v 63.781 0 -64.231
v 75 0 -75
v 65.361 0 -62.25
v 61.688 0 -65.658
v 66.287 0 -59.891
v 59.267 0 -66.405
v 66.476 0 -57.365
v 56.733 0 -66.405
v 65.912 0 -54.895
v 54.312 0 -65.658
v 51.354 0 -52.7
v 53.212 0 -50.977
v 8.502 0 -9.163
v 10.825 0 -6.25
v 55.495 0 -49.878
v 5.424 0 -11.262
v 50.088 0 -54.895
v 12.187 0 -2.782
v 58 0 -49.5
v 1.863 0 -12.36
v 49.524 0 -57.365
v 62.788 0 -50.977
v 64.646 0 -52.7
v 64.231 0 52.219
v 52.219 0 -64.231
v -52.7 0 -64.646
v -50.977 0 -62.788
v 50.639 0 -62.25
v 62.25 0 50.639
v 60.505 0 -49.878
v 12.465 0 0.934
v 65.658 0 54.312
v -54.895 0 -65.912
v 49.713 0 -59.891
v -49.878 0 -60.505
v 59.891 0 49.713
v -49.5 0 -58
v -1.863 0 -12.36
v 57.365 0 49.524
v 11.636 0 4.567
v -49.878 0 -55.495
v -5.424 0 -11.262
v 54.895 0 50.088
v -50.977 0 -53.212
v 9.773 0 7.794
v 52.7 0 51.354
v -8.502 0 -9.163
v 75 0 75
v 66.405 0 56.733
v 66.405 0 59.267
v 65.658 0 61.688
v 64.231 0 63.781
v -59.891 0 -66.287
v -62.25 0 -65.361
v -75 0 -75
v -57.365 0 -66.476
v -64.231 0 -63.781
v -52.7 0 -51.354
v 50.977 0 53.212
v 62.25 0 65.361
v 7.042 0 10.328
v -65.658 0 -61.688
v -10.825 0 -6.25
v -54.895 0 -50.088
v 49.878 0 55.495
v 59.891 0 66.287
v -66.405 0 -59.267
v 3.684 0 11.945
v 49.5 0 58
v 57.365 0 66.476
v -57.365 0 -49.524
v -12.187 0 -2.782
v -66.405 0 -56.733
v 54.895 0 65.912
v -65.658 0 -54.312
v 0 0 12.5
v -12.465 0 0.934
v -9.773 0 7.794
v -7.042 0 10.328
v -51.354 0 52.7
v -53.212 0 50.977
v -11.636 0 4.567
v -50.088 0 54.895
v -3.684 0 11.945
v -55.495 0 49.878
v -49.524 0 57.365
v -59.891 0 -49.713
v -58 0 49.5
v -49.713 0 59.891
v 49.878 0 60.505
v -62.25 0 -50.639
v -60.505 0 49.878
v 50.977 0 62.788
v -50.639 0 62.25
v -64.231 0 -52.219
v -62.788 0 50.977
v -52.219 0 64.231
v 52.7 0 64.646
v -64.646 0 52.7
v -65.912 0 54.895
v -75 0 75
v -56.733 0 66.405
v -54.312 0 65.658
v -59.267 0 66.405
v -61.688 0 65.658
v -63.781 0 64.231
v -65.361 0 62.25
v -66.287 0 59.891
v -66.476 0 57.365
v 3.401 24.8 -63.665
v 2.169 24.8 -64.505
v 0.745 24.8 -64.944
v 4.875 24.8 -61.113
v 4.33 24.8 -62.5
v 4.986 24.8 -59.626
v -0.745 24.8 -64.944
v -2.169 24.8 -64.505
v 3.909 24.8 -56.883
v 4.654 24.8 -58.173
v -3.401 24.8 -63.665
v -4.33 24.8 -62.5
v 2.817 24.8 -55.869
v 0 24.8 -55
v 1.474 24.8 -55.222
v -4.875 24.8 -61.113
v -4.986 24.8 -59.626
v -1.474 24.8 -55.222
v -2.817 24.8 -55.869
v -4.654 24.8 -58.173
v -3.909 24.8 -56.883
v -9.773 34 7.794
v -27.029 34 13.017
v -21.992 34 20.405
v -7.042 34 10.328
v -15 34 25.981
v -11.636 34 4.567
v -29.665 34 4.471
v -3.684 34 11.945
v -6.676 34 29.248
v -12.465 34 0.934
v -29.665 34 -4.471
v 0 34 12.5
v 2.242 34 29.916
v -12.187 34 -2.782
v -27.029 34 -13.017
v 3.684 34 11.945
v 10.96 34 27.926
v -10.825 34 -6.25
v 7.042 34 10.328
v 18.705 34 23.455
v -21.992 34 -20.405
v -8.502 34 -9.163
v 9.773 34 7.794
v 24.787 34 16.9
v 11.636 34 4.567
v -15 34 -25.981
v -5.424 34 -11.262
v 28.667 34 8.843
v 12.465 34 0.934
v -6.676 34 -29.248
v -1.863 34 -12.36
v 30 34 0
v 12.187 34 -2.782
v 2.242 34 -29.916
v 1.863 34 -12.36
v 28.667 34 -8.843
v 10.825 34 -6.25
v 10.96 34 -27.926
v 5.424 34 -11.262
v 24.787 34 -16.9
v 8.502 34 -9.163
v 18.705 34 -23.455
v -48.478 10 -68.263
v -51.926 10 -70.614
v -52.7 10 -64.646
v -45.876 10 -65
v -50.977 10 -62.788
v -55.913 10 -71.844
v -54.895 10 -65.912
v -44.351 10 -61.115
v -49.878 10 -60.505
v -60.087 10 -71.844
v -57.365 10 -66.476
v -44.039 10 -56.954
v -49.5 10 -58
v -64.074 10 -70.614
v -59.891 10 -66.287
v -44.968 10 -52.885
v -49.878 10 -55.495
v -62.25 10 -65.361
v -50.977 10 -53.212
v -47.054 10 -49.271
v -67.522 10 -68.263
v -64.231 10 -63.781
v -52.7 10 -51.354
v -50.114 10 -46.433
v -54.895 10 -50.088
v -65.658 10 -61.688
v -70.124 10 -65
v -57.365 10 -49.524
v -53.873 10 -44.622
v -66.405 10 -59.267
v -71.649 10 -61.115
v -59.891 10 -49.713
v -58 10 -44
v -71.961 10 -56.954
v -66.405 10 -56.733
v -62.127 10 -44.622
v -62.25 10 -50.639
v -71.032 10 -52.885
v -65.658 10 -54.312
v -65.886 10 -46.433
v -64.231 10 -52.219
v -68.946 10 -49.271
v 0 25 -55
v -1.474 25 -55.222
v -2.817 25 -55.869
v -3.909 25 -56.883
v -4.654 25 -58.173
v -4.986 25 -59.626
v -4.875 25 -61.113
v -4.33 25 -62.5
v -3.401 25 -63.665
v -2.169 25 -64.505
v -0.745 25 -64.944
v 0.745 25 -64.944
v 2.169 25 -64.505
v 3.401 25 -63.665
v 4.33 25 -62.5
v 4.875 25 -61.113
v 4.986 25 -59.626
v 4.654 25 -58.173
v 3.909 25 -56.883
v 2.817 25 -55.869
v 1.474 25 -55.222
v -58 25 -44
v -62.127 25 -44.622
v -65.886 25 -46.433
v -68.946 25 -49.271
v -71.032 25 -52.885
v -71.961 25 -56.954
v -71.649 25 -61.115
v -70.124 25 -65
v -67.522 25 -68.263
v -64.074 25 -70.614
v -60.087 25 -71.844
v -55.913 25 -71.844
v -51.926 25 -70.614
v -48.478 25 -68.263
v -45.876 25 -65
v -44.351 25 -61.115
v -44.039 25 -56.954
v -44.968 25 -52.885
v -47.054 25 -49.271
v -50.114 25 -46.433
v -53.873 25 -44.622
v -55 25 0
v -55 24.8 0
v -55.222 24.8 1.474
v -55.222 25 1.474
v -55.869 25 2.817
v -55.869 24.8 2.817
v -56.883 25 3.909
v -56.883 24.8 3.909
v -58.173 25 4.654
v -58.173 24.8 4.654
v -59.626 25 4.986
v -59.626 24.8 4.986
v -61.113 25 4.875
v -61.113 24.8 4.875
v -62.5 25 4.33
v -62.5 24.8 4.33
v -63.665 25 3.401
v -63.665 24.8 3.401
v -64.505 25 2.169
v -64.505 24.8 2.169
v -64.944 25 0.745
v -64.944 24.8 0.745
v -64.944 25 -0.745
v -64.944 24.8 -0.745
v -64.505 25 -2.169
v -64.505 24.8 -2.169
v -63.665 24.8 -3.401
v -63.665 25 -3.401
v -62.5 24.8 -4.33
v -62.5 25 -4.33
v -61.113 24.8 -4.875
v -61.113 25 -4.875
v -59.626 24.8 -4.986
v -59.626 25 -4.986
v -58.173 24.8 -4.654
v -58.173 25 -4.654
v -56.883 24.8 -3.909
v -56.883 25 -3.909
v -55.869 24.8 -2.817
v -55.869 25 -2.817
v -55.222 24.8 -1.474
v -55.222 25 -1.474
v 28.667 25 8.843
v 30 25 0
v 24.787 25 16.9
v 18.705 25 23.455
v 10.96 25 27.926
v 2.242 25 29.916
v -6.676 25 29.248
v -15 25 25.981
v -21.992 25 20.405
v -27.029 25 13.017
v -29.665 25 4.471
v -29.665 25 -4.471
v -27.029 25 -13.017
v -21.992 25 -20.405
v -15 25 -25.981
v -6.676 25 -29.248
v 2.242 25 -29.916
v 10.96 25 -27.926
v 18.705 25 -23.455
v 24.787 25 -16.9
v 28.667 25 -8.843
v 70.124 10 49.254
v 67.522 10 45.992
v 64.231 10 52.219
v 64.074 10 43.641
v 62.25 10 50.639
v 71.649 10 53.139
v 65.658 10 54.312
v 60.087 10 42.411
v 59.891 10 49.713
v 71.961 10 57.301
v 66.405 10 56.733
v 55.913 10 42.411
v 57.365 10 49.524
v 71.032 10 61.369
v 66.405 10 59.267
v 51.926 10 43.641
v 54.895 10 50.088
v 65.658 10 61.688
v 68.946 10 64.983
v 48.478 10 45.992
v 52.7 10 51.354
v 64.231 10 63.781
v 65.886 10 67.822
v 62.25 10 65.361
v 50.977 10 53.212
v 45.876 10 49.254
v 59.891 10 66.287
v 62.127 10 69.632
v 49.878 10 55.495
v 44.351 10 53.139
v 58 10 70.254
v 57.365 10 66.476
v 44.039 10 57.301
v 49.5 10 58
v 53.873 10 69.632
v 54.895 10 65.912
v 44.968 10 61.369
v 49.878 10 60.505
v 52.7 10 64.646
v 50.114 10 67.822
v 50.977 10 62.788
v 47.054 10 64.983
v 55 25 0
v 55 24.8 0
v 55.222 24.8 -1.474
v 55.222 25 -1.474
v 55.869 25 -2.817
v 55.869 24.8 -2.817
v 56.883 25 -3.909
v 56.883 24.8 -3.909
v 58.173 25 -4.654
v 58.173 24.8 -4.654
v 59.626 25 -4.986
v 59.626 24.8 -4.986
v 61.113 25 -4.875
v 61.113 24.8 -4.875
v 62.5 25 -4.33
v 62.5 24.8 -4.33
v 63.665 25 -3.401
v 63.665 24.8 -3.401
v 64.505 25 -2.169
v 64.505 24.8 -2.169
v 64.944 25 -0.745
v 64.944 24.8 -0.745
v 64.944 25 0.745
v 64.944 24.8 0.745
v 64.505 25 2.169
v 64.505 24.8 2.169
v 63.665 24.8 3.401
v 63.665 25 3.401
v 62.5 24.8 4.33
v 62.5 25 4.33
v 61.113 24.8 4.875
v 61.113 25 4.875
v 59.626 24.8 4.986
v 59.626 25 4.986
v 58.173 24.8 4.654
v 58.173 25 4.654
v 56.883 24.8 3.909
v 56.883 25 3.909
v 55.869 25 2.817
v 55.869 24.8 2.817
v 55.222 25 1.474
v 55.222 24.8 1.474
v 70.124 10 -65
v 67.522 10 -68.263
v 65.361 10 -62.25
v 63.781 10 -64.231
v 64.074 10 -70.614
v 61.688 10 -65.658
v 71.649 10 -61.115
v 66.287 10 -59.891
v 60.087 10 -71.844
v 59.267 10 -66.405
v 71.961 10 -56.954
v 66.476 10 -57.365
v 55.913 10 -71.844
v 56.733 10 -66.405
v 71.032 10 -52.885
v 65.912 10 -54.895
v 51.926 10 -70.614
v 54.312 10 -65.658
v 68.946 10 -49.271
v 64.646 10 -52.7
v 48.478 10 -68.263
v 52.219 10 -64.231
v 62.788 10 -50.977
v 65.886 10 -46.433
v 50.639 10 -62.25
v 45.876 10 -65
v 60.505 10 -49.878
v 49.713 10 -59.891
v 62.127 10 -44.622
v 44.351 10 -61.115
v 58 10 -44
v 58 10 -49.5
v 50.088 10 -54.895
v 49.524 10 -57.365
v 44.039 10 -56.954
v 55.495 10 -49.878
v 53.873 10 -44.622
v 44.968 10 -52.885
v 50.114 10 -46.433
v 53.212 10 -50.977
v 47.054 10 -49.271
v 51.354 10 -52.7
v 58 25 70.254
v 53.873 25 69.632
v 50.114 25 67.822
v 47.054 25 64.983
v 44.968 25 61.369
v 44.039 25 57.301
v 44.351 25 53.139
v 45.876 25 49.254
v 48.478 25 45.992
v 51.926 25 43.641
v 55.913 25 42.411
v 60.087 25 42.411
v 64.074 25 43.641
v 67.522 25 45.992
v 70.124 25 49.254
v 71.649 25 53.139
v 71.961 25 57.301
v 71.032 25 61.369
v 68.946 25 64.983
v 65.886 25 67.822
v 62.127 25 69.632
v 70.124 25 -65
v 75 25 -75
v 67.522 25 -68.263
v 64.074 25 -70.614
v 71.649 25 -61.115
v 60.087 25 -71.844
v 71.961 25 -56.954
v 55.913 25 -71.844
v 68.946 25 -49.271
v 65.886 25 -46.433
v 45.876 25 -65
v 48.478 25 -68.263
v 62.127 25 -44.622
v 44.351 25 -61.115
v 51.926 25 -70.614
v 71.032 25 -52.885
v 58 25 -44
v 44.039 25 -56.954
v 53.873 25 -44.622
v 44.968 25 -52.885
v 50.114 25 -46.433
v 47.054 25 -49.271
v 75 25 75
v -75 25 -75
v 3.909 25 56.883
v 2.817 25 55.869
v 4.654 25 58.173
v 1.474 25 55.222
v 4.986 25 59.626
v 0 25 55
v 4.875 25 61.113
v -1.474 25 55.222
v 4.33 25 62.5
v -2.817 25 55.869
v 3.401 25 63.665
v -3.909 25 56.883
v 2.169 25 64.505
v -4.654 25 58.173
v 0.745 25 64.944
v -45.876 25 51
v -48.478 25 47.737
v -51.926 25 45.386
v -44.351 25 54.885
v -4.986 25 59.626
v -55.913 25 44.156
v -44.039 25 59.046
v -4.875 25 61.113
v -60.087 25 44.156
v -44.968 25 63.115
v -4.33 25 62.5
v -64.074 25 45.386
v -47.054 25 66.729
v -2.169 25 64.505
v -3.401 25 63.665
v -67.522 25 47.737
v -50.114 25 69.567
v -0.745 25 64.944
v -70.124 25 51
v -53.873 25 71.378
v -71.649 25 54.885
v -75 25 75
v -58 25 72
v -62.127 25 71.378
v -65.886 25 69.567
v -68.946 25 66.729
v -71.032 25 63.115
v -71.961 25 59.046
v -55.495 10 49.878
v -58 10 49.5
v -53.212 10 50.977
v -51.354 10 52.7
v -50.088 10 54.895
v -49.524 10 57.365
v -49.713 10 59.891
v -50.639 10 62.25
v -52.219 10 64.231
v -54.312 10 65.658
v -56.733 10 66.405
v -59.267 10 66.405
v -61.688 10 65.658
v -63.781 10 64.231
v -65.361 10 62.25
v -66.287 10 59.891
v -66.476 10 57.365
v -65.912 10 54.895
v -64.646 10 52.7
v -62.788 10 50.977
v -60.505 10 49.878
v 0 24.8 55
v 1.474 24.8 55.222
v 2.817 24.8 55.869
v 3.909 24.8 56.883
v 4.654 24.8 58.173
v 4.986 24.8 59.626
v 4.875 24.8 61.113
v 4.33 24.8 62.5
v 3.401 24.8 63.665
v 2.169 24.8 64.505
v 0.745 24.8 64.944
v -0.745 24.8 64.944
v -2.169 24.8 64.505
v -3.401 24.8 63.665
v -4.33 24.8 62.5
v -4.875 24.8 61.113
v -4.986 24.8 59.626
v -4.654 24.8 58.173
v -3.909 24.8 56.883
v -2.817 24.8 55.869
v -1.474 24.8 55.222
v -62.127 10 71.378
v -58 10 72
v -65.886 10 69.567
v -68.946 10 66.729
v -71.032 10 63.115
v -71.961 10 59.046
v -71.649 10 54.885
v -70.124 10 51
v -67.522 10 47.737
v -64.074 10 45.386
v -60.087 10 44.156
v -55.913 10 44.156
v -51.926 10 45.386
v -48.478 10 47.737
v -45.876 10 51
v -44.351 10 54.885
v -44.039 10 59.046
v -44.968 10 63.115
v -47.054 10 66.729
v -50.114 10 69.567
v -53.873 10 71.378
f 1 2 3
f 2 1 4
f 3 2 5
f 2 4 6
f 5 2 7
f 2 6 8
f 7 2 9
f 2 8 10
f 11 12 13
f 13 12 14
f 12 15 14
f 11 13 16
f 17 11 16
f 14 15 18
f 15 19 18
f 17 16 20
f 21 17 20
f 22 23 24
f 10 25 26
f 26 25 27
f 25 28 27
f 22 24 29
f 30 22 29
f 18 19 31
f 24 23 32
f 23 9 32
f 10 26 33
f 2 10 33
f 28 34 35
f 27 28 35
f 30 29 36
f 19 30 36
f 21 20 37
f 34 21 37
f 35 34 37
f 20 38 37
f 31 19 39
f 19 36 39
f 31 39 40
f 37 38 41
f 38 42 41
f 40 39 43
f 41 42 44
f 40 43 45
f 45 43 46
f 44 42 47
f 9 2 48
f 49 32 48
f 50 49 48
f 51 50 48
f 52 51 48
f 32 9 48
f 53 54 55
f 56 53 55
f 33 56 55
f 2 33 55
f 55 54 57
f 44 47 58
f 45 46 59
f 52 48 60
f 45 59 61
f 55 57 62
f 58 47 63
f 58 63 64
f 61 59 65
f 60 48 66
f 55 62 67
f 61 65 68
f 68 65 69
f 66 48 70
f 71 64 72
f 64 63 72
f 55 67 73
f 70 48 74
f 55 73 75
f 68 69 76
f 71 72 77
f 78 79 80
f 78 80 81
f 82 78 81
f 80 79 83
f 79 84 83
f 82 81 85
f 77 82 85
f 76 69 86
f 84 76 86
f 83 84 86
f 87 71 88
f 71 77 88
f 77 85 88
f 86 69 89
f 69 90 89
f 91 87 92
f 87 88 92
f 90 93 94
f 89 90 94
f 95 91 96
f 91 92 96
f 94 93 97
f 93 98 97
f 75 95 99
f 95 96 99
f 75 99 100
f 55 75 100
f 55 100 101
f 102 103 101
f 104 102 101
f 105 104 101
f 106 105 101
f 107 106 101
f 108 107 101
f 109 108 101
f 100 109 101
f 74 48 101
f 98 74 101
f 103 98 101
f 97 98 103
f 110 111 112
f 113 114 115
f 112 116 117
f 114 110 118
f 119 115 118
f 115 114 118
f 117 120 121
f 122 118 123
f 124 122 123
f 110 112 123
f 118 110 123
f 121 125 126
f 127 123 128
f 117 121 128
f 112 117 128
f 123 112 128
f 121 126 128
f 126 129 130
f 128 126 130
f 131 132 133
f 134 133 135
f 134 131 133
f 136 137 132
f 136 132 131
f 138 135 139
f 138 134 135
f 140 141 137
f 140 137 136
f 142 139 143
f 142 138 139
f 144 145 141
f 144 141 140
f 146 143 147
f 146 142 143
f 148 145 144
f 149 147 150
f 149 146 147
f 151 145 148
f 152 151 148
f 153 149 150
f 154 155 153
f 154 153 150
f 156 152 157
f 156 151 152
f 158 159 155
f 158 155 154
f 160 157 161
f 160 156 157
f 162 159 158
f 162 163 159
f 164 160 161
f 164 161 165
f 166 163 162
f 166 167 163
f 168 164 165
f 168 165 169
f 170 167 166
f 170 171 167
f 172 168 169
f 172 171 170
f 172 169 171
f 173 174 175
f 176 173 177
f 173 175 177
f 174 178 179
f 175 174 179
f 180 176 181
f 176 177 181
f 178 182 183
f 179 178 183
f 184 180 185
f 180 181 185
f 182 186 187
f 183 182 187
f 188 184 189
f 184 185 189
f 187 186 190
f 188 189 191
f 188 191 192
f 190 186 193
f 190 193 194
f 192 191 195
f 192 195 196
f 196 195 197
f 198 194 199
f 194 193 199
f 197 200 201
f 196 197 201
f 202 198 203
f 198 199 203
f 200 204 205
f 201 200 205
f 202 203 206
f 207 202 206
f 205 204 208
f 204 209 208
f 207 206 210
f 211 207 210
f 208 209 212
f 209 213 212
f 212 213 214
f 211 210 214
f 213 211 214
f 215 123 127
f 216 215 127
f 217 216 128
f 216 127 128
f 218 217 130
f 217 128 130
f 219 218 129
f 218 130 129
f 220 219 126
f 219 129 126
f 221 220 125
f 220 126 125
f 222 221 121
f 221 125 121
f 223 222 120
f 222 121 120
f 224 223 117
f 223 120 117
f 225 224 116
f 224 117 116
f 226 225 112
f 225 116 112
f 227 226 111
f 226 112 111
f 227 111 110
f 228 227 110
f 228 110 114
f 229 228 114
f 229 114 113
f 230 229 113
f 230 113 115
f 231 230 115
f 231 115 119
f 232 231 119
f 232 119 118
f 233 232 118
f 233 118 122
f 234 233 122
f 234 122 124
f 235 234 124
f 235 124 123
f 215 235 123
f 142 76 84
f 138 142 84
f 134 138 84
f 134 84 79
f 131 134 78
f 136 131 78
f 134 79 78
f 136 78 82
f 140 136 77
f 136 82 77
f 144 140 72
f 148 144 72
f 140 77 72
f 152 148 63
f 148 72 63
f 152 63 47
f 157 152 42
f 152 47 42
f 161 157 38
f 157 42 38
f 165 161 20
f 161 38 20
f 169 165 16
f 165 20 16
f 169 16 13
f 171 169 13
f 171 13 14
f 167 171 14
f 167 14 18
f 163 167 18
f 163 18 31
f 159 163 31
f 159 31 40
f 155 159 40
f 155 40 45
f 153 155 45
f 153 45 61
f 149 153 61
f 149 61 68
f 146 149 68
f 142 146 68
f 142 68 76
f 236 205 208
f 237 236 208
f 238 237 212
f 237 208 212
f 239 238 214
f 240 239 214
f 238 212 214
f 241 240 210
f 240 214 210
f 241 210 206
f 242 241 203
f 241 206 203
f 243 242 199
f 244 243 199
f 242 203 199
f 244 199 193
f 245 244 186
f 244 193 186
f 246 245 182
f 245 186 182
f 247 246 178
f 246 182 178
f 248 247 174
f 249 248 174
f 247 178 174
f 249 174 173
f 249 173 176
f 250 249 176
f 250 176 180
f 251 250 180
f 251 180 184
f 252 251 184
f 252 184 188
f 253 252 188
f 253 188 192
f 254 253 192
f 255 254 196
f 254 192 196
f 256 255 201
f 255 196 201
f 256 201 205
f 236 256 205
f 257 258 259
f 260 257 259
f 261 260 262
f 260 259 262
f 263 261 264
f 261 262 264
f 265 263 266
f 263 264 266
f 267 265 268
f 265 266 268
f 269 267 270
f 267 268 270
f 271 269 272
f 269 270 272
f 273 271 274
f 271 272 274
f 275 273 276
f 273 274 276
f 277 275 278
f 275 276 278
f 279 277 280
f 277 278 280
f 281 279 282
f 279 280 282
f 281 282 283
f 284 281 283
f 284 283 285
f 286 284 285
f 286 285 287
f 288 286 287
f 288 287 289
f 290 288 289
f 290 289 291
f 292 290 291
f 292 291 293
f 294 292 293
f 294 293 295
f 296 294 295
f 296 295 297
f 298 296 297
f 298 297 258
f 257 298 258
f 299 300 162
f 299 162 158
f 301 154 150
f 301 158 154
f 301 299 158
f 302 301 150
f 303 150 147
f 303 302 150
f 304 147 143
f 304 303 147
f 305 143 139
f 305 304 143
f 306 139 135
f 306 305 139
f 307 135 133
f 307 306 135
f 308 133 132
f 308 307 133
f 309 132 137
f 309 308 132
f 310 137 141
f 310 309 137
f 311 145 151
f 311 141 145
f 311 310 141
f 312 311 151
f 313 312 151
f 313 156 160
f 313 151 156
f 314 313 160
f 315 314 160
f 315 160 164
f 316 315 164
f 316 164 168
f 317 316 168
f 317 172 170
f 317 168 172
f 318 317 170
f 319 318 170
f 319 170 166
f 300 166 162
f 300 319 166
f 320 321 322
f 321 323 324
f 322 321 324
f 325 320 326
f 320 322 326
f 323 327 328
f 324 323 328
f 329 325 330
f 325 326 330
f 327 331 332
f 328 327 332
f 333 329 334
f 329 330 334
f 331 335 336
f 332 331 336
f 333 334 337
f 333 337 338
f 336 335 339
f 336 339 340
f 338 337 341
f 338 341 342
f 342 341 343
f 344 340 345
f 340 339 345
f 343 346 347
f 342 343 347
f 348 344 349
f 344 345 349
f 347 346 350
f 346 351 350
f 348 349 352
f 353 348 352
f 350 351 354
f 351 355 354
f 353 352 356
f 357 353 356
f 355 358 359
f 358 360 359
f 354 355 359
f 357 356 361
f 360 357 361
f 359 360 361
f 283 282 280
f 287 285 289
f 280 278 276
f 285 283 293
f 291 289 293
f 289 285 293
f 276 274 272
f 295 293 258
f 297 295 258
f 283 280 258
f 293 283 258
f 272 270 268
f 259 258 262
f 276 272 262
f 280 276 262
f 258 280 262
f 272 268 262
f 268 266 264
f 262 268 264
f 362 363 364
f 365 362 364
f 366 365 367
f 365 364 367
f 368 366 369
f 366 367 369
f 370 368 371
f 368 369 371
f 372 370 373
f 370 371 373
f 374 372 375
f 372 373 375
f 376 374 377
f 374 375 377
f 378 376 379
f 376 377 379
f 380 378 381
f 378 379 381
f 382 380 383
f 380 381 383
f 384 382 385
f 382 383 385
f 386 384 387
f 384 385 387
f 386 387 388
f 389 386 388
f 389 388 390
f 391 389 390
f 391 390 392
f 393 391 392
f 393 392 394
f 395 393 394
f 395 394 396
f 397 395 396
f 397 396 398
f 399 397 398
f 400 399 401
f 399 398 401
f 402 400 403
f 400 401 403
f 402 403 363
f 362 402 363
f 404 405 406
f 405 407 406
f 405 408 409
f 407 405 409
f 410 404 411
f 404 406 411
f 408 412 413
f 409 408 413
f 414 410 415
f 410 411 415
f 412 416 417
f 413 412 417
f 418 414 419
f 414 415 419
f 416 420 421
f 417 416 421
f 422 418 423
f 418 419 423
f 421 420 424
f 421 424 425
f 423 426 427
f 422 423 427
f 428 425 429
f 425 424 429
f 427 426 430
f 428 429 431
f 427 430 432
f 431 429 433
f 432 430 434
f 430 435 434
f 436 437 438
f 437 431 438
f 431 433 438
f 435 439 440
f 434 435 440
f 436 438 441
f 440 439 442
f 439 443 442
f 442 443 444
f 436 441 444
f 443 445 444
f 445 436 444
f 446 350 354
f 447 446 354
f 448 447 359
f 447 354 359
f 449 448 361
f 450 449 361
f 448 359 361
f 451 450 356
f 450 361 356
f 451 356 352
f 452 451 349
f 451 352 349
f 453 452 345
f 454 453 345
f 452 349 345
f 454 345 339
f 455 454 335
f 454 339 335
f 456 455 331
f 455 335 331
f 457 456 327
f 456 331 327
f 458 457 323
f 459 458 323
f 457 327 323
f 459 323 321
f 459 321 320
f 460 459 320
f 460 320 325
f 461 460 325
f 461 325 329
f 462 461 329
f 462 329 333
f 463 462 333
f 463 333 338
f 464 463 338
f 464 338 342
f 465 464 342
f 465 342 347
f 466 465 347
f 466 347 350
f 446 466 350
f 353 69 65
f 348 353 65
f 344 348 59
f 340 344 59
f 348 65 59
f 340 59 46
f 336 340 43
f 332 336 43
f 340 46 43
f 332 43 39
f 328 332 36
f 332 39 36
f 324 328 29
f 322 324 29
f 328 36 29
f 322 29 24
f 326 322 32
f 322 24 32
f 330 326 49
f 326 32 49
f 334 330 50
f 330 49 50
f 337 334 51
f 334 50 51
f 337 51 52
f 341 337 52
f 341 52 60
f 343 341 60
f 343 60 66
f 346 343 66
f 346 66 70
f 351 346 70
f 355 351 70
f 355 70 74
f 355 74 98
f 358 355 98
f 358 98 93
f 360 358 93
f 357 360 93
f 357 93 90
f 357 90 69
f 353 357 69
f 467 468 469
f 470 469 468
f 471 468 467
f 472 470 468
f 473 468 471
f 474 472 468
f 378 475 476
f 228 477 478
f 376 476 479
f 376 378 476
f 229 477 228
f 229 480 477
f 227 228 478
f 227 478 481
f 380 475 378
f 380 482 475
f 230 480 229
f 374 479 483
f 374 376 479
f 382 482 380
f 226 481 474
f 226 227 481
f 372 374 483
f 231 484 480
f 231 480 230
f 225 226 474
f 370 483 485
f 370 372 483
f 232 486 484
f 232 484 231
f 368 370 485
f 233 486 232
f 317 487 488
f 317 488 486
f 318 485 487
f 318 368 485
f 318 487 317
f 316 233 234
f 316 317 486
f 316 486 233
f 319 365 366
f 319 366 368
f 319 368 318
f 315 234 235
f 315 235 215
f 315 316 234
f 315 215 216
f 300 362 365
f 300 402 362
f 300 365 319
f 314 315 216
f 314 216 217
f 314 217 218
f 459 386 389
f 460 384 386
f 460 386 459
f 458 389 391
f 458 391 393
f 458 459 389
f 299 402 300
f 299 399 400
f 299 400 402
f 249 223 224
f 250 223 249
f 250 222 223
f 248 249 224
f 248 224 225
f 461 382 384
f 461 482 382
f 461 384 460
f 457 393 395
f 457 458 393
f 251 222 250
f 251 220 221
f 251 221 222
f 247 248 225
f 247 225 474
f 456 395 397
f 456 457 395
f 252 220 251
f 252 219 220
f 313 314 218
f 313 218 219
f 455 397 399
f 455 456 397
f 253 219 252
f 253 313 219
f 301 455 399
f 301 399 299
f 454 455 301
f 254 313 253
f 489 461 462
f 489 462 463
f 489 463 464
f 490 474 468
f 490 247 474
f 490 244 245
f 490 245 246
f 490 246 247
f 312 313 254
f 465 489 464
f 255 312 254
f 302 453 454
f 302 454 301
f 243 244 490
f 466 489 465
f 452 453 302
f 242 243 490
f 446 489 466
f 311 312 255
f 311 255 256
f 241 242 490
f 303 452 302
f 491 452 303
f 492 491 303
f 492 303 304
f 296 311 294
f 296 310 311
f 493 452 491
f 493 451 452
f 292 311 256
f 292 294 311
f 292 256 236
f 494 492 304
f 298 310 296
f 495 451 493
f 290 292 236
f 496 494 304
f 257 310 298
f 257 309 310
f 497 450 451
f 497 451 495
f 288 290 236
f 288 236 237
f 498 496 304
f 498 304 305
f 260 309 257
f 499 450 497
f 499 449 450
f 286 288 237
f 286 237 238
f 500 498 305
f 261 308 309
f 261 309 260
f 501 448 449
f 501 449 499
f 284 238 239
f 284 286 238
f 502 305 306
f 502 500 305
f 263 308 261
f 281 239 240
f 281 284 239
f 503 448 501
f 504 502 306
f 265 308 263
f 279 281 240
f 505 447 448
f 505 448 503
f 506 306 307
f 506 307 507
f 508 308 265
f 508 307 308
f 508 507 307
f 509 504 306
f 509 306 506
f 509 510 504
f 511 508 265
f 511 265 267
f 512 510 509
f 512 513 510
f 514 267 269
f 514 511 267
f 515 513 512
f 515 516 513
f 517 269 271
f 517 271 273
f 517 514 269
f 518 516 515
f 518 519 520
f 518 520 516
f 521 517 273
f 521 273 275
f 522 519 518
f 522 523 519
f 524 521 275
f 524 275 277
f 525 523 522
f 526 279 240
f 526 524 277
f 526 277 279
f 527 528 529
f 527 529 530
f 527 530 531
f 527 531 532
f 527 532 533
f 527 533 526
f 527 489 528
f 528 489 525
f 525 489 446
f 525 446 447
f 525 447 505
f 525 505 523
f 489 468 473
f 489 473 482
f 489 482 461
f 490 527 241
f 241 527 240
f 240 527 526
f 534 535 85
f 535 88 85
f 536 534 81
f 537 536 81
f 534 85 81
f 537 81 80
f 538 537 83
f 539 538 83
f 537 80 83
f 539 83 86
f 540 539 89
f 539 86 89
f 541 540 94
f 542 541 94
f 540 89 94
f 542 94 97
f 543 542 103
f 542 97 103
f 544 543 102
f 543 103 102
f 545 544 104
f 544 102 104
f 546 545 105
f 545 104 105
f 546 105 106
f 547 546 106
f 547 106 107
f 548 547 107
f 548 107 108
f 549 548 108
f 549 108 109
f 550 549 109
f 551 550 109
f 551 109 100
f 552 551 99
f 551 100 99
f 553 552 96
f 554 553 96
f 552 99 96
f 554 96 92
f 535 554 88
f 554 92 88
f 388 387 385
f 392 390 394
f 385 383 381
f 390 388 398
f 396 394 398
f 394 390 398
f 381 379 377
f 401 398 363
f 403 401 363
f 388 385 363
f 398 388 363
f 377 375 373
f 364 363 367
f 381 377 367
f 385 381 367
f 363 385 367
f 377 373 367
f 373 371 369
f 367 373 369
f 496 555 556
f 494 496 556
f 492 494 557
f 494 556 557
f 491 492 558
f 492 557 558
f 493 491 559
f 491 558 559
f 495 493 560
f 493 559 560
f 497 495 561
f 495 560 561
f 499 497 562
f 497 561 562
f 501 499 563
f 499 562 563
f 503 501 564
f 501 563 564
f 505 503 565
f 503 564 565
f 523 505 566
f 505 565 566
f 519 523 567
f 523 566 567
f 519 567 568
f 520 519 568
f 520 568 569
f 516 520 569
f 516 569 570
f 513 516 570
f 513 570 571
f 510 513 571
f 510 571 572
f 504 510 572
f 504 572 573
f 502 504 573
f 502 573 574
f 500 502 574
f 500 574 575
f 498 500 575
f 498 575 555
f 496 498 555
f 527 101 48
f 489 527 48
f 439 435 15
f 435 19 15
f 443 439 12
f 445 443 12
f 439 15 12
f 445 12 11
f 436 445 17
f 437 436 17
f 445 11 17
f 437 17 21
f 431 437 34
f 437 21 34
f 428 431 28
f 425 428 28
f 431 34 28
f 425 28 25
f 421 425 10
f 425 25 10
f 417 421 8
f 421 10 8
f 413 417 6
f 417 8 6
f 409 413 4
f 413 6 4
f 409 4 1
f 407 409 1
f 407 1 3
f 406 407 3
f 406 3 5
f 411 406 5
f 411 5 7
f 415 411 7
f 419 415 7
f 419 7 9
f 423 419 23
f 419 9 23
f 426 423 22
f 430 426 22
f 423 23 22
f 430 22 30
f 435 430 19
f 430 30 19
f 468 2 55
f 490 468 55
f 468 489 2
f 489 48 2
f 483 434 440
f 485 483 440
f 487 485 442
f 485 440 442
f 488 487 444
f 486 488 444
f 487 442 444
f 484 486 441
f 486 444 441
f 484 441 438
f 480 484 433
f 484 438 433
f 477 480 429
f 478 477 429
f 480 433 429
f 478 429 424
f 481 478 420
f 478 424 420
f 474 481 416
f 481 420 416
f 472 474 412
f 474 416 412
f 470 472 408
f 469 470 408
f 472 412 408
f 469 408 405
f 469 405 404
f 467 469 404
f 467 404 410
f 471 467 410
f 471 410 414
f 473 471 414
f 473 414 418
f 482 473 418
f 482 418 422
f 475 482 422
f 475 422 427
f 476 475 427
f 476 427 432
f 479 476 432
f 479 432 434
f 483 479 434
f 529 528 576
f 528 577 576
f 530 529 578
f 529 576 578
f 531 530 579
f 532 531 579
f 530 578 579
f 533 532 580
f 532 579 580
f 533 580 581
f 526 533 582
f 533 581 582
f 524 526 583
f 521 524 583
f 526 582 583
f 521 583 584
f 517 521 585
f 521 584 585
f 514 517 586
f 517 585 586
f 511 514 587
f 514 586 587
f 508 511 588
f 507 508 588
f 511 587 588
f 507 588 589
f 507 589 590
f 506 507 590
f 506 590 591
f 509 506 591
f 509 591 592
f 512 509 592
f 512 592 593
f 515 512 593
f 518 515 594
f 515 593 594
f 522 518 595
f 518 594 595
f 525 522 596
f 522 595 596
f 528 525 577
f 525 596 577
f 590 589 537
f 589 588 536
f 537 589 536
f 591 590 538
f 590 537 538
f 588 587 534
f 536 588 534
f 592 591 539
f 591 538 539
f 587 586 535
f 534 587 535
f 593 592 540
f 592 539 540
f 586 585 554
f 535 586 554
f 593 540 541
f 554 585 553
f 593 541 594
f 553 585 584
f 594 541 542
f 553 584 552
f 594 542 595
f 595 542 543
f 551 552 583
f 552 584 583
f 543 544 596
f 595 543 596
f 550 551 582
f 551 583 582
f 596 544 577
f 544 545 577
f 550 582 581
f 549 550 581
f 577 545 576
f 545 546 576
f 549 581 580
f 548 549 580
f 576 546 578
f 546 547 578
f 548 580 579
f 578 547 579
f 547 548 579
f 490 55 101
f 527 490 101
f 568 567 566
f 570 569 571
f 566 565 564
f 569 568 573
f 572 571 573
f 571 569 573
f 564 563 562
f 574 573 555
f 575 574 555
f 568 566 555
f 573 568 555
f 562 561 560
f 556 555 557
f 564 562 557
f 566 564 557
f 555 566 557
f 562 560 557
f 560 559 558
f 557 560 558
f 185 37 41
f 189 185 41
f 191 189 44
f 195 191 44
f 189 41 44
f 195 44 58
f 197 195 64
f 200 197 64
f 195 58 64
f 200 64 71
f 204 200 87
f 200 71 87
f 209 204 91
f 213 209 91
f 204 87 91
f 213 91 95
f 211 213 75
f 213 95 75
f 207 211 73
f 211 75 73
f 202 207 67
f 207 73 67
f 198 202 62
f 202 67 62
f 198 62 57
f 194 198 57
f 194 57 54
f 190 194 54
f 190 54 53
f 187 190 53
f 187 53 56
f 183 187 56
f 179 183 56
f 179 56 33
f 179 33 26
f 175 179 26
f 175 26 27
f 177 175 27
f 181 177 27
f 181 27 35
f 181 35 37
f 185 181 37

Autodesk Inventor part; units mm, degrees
ref_plane "YZ Plane" through (0, 0, 0) normal (1, 0, 0) x (0, 1, 0)
ref_plane "XZ Plane" through (0, 0, 0) normal (0, 1, 0) x (-1, 0, 0)
ref_plane "XY Plane" through (0, 0, 0) normal (0, 0, 1) x (1, 0, 0)
sketch "Sketch1" plane through (0, 0, 0) normal (0, 1, 0) x (-1, 0, 0)
  line L0 (-75, -75) -> (75, -75)
  line L1 (75, -75) -> (75, 75)
  line L2 (75, 75) -> (-75, 75)
  line L3 (-75, 75) -> (-75, -75)
  line L4 (-75, -75) -> (75, 75) construction
  line L5 (75, -75) -> (-75, 75) construction
  point P0 (0, 0)
  dimension "d0" = 150
  dimension "d1" = 150
extrude "Extrusion1" add sketch "Sketch1" along normal blind 25
sketch "Sketch2" plane through (0, 25, 0) normal (0, 1, 0) x (1, 0, 0)
  circle A0 centre (0, 0) radius 30
  dimension "d4" = 60
sketch "Sketch3" plane through (0, 25, 0) normal (0, 1, 0) x (1, 0, 0)
  line L0 (58, 58) -> (-58, 58) construction
  line L1 (-58, 58) -> (-58, -58) construction
  line L2 (-58, -58) -> (58, -58) construction
  line L3 (58, -58) -> (58, 58) construction
  line L4 (58, 58) -> (-58, -58) construction
  line L5 (-58, 58) -> (58, -58) construction
  circle A0 centre (0, 0) radius 60 construction
  point P0 (58, -56.2544)
  point P1 (0, 60)
  dimension "d7" = 120
  dimension "d5" = 116
  dimension "d6" = 116
extrude "Extrusion2" add sketch "Sketch2" along normal blind 9
hole "Hole1" at (-58, 25, -58) at (58, 25, -58) at (58, 25, 56.2544) at (-58, 25, 58) direction (0, -1, 0) diameter 28 depth 15
hole "Hole2" at (0, 25, -60) direction (0, -1, 0) diameter 10 depth 0.2
pattern_circular "Circular Pattern1" count 4 over 360 about axis through (0, 25, 0) along (0, 1, 0) of "Hole2"
sketch "Sketch5" plane through (0, 34, 0) normal (0, 1, 0) x (1, 0, 0)
  circle A0 centre (0, 0) radius 30 construction
hole "Hole5" at (0, 34, 0) direction (0, -1, 0) diameter 25 end through all
thread "Thread1" size "M25x1.5" class "6H" standard "ANSI Metric M Profile" length 30
sketch "Sketch6" plane through (58, 10, -58) normal (0, 1, 0) x (1, 0, 0)
  circle A0 centre (0, 0) radius 14 construction
  circle A1 centre (0, 0) radius 8.5
  point P0 (-58, -58)
  dimension "d50" = 17
hole "Hole6" at (58, 10, -58) direction (0, -1, 0) diameter 17 end through all
pattern_circular "Circular Pattern2" count 4 over 360 about axis through (0, 25, 0) along (0, 1, 0) of "Hole6"
properties part number "BasePlate" material "Iron, Cast"
